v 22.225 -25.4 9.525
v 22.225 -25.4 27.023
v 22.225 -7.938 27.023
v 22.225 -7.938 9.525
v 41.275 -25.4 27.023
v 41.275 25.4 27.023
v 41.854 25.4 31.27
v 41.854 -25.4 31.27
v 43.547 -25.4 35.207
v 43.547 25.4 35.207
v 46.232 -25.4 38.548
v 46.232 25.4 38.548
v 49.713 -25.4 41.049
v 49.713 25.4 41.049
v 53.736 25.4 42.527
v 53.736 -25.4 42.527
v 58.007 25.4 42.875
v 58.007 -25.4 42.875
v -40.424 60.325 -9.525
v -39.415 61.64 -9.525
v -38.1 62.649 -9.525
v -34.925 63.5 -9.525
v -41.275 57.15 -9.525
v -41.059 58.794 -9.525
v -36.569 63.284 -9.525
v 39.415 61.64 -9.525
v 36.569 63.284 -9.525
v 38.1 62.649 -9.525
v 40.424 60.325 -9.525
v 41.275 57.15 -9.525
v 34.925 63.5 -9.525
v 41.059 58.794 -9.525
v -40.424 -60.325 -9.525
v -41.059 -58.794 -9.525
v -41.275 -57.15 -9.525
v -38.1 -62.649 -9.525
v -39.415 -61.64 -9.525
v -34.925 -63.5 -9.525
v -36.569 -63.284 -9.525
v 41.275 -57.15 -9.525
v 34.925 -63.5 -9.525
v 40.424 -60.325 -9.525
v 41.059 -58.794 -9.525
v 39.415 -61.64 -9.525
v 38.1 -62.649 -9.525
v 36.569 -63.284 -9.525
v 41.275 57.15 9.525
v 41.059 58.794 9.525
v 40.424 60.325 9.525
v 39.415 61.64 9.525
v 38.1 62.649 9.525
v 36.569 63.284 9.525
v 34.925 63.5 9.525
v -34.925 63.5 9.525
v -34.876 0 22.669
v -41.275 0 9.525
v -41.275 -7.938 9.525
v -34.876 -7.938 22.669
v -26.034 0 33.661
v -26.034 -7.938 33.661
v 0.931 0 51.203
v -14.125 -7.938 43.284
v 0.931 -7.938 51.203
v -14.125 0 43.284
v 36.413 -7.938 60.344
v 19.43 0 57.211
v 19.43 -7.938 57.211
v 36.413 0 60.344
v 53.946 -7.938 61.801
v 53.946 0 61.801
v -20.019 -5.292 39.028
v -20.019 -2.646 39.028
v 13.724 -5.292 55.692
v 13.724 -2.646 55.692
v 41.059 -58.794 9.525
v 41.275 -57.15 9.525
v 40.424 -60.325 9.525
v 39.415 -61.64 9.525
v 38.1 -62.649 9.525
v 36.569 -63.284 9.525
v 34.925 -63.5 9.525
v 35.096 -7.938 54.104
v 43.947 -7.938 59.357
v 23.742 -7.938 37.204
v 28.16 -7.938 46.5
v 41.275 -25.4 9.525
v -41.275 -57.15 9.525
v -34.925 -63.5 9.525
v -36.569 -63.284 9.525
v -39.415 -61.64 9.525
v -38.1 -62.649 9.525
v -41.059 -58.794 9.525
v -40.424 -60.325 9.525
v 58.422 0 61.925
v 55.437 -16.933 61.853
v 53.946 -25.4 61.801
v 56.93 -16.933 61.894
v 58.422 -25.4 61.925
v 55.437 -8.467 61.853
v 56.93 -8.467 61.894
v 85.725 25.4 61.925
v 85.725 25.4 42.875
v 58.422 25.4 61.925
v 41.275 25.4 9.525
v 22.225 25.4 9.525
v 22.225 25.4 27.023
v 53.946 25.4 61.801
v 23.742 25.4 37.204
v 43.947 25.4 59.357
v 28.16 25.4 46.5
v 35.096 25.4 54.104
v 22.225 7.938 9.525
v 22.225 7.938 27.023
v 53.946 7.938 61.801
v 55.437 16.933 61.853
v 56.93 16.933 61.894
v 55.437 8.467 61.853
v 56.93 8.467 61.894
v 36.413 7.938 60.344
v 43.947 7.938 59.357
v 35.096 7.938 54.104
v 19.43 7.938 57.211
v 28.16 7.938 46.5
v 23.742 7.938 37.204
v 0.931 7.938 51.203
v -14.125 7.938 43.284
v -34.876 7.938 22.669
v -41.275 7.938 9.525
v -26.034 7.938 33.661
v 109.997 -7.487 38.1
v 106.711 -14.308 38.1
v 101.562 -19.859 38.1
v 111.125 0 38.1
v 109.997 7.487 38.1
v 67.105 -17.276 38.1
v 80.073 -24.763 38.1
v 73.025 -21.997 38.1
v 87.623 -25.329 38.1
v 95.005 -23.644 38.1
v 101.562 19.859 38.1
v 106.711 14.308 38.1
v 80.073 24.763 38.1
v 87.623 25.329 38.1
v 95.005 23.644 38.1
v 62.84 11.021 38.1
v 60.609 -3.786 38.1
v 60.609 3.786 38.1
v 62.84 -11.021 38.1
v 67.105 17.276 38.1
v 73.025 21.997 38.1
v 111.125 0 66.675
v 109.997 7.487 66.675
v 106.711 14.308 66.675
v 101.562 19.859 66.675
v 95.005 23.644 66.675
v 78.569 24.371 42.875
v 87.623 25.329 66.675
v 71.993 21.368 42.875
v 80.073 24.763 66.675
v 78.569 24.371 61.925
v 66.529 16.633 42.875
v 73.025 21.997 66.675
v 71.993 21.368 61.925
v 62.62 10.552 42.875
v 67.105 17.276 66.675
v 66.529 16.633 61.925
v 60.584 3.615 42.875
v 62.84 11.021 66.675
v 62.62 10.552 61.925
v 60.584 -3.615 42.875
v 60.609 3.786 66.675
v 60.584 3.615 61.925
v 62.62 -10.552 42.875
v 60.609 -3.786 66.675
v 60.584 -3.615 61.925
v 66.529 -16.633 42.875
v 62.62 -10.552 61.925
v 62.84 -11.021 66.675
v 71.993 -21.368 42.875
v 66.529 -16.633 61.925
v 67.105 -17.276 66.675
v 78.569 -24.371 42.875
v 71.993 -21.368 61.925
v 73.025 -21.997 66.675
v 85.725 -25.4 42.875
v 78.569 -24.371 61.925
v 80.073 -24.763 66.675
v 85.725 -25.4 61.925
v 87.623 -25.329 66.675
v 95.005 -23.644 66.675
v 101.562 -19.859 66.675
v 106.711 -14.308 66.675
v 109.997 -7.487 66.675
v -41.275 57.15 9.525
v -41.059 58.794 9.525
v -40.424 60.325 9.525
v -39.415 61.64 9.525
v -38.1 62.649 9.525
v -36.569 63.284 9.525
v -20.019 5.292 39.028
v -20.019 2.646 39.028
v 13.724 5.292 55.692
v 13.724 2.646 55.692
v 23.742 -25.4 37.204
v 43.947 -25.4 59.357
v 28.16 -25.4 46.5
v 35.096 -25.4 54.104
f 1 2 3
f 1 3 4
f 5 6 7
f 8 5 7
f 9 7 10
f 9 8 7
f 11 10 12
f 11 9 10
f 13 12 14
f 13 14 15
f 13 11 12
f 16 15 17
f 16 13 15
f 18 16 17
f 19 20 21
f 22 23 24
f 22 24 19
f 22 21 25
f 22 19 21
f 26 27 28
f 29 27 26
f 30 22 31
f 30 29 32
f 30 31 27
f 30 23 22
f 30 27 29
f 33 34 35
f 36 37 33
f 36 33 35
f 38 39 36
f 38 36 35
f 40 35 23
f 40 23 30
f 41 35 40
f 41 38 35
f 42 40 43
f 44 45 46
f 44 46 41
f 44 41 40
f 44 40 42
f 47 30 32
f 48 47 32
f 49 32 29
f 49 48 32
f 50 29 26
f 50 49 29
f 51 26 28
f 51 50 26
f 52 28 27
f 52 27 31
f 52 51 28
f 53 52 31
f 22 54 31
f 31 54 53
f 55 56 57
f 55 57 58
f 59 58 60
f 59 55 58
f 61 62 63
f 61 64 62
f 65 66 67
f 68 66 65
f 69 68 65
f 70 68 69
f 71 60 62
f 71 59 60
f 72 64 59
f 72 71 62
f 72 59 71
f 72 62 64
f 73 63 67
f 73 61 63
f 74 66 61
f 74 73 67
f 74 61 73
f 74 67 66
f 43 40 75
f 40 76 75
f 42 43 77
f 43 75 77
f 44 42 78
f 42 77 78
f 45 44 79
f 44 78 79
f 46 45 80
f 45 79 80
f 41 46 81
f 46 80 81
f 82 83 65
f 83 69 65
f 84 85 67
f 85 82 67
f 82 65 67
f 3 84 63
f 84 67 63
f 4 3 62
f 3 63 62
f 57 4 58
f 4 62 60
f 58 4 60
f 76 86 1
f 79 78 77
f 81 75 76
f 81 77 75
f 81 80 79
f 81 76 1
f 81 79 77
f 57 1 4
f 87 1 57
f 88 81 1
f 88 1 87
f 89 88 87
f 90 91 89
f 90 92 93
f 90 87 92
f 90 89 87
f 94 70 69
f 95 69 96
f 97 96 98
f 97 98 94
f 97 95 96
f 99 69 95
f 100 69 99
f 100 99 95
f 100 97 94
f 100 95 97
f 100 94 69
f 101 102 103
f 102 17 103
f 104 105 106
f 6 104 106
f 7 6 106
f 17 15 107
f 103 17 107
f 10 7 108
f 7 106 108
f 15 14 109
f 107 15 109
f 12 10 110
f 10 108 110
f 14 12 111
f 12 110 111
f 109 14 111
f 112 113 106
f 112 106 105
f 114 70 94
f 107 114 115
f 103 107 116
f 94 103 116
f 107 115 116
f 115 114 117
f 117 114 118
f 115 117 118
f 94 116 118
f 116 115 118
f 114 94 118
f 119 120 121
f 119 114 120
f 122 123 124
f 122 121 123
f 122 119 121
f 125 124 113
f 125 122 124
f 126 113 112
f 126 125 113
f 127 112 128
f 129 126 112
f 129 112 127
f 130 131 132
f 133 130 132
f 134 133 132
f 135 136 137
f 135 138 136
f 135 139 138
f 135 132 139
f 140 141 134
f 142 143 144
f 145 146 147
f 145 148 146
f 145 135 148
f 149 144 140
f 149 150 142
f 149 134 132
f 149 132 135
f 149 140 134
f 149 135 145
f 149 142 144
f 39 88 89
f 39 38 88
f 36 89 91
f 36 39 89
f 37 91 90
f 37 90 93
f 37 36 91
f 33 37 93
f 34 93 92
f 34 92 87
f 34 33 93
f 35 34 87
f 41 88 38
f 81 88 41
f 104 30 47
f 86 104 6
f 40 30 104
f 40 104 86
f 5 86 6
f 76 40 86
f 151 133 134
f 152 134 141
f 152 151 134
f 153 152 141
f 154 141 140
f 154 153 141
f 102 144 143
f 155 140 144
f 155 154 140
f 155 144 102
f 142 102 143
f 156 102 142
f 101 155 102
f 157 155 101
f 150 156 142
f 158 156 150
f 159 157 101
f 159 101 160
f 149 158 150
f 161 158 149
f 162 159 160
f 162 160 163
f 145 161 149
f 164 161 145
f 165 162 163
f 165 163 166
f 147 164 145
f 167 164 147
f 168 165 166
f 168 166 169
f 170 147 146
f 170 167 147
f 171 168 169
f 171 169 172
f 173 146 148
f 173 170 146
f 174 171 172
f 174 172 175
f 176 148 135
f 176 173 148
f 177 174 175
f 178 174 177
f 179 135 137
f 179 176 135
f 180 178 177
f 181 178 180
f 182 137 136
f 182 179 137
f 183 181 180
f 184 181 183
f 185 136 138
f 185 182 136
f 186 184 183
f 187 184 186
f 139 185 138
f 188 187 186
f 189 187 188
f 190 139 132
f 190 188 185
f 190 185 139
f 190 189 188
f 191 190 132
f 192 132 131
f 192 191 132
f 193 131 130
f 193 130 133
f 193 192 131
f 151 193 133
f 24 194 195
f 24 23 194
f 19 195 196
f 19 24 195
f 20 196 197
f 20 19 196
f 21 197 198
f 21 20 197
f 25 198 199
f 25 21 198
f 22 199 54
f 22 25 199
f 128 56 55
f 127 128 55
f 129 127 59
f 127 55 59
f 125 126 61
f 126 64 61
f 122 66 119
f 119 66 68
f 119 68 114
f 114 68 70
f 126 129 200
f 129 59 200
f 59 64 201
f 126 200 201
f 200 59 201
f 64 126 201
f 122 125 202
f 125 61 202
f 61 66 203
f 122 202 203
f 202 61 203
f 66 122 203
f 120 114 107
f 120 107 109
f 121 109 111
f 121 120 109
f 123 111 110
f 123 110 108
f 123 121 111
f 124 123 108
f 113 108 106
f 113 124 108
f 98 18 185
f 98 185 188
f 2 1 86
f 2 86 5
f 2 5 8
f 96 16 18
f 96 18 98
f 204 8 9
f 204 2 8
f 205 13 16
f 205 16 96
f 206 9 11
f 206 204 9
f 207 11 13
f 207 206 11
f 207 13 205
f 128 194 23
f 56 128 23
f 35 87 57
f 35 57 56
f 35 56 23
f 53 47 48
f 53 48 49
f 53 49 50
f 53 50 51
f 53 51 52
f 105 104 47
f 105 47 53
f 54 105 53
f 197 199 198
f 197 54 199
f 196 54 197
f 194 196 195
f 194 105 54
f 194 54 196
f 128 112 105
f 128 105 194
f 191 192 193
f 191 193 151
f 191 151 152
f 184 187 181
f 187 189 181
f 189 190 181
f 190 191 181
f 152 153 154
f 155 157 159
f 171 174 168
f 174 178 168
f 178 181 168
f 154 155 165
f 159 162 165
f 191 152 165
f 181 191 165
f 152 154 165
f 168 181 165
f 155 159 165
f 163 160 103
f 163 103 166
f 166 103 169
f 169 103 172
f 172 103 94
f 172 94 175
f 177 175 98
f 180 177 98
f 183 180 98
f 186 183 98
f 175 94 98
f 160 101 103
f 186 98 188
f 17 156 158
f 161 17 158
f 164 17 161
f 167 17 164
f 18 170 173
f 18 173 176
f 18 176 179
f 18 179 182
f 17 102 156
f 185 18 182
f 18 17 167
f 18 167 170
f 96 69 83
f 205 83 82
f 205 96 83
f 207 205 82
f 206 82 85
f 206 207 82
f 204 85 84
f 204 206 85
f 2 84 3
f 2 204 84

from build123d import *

# Parameters (mm, degrees)
F1_DEPTH = 63.5
F2_DEPTH = 25.4
F3_DEPTH = 7.9375
F4_DEPTH = 25.4
F0_W     = 25.4
F0_H     = 4.7498
F0_H_2   = 4.7752
F6_R     = 6.35


with BuildPart() as f1:
    # F0 (on Front) → F1 (new body, symmetric)
    with BuildSketch(Plane.XZ):
        Polygon((22.225, 9.525), (-41.275, 9.525), (-41.275, -9.525), (41.275, -9.525), (41.275, 9.525), align=None)
    extrude(amount=F1_DEPTH, both=True)

    # F0 (on Front) → F2 (join, symmetric)
    with BuildSketch(Plane.XZ):
        with BuildLine():
            Line((22.225, 27.0233751515), (22.225, 9.525))
            Line((22.225, 9.525), (41.275, 9.525))
            Line((41.275, 9.525), (41.275, 27.0233751515))
            ThreePointArc((41.275, 27.0233751515), (46.232053506, 38.5478738111), (58.0074811786, 42.8752))
            Line((58.0074811786, 42.8752), (60.325, 42.8752))
            Line((60.325, 42.8752), (60.325, 61.9252))
            Line((60.325, 61.9252), (58.4221034718, 61.9252))
            add(Edge.make_bspline(
                [(53.9455429382, 61.8010559243), (55.4372337649, 61.858340914), (56.9298403376, 61.8995627303), (58.4221034718, 61.9252)],
                knots=[108.7173325618, 108.7173325618, 108.7173325618, 108.7173325618, 112.6290078119, 112.6290078119, 112.6290078119, 112.6290078119], degree=3))
            ThreePointArc((53.9455429382, 61.8010559243), (31.3462087293, 50.5588798425), (22.225, 27.0233751515))
        make_face()
    extrude(amount=F2_DEPTH, both=True)

    # F0 (on Front) → F3 (join, symmetric)
    with BuildSketch(Plane.XZ):
        with BuildLine():
            add(Edge.make_bspline(
                [(-41.275, 9.525), (-28.2643212455, 46.2087638667), (12.486925514, 60.2089321217), (53.9455429382, 61.8010559243)],
                knots=[0, 0, 0, 0, 108.7173325618, 108.7173325618, 108.7173325618, 108.7173325618], degree=3))
            Line((-41.275, 9.525), (22.225, 9.525))
            Line((22.225, 9.525), (22.225, 27.0233751515))
            ThreePointArc((22.225, 27.0233751515), (31.3462087293, 50.5588798425), (53.9455429382, 61.8010559243))
        make_face()
    extrude(amount=F3_DEPTH, both=True)

    # F4 (add): a face of the model
    f4_faces = [f1.faces().sort_by_distance(p)[0] for p in [
        (60.325, 0, 52.4002),
    ]]
    extrude(f4_faces, amount=F4_DEPTH)

    # F0 (on Front) → F5 (revolve)
    with BuildSketch(Plane.XZ):
        with Locations((98.425, 64.3001)):
            Rectangle(F0_W, F0_H)
        Polygon((111.125, 61.9252), (85.725, 61.9252), (85.725, 52.3875), (85.725, 42.8752), (111.125, 42.8752), align=None)
        with Locations((98.425, 40.4876)):
            Rectangle(F0_W, F0_H_2)
    revolve(axis=Axis((85.725, 0, 52.3875), (0, 0, 1)))

    # F6
    f6_edges = [f1.edges().sort_by_distance(p)[0] for p in [
        (41.275, -63.5, 0),
        (-41.275, -63.5, 0),
        (41.275, 63.5, 0),
        (-41.275, 63.5, 0),
    ]]
    fillet(f6_edges, radius=F6_R)


solid = f1.part
